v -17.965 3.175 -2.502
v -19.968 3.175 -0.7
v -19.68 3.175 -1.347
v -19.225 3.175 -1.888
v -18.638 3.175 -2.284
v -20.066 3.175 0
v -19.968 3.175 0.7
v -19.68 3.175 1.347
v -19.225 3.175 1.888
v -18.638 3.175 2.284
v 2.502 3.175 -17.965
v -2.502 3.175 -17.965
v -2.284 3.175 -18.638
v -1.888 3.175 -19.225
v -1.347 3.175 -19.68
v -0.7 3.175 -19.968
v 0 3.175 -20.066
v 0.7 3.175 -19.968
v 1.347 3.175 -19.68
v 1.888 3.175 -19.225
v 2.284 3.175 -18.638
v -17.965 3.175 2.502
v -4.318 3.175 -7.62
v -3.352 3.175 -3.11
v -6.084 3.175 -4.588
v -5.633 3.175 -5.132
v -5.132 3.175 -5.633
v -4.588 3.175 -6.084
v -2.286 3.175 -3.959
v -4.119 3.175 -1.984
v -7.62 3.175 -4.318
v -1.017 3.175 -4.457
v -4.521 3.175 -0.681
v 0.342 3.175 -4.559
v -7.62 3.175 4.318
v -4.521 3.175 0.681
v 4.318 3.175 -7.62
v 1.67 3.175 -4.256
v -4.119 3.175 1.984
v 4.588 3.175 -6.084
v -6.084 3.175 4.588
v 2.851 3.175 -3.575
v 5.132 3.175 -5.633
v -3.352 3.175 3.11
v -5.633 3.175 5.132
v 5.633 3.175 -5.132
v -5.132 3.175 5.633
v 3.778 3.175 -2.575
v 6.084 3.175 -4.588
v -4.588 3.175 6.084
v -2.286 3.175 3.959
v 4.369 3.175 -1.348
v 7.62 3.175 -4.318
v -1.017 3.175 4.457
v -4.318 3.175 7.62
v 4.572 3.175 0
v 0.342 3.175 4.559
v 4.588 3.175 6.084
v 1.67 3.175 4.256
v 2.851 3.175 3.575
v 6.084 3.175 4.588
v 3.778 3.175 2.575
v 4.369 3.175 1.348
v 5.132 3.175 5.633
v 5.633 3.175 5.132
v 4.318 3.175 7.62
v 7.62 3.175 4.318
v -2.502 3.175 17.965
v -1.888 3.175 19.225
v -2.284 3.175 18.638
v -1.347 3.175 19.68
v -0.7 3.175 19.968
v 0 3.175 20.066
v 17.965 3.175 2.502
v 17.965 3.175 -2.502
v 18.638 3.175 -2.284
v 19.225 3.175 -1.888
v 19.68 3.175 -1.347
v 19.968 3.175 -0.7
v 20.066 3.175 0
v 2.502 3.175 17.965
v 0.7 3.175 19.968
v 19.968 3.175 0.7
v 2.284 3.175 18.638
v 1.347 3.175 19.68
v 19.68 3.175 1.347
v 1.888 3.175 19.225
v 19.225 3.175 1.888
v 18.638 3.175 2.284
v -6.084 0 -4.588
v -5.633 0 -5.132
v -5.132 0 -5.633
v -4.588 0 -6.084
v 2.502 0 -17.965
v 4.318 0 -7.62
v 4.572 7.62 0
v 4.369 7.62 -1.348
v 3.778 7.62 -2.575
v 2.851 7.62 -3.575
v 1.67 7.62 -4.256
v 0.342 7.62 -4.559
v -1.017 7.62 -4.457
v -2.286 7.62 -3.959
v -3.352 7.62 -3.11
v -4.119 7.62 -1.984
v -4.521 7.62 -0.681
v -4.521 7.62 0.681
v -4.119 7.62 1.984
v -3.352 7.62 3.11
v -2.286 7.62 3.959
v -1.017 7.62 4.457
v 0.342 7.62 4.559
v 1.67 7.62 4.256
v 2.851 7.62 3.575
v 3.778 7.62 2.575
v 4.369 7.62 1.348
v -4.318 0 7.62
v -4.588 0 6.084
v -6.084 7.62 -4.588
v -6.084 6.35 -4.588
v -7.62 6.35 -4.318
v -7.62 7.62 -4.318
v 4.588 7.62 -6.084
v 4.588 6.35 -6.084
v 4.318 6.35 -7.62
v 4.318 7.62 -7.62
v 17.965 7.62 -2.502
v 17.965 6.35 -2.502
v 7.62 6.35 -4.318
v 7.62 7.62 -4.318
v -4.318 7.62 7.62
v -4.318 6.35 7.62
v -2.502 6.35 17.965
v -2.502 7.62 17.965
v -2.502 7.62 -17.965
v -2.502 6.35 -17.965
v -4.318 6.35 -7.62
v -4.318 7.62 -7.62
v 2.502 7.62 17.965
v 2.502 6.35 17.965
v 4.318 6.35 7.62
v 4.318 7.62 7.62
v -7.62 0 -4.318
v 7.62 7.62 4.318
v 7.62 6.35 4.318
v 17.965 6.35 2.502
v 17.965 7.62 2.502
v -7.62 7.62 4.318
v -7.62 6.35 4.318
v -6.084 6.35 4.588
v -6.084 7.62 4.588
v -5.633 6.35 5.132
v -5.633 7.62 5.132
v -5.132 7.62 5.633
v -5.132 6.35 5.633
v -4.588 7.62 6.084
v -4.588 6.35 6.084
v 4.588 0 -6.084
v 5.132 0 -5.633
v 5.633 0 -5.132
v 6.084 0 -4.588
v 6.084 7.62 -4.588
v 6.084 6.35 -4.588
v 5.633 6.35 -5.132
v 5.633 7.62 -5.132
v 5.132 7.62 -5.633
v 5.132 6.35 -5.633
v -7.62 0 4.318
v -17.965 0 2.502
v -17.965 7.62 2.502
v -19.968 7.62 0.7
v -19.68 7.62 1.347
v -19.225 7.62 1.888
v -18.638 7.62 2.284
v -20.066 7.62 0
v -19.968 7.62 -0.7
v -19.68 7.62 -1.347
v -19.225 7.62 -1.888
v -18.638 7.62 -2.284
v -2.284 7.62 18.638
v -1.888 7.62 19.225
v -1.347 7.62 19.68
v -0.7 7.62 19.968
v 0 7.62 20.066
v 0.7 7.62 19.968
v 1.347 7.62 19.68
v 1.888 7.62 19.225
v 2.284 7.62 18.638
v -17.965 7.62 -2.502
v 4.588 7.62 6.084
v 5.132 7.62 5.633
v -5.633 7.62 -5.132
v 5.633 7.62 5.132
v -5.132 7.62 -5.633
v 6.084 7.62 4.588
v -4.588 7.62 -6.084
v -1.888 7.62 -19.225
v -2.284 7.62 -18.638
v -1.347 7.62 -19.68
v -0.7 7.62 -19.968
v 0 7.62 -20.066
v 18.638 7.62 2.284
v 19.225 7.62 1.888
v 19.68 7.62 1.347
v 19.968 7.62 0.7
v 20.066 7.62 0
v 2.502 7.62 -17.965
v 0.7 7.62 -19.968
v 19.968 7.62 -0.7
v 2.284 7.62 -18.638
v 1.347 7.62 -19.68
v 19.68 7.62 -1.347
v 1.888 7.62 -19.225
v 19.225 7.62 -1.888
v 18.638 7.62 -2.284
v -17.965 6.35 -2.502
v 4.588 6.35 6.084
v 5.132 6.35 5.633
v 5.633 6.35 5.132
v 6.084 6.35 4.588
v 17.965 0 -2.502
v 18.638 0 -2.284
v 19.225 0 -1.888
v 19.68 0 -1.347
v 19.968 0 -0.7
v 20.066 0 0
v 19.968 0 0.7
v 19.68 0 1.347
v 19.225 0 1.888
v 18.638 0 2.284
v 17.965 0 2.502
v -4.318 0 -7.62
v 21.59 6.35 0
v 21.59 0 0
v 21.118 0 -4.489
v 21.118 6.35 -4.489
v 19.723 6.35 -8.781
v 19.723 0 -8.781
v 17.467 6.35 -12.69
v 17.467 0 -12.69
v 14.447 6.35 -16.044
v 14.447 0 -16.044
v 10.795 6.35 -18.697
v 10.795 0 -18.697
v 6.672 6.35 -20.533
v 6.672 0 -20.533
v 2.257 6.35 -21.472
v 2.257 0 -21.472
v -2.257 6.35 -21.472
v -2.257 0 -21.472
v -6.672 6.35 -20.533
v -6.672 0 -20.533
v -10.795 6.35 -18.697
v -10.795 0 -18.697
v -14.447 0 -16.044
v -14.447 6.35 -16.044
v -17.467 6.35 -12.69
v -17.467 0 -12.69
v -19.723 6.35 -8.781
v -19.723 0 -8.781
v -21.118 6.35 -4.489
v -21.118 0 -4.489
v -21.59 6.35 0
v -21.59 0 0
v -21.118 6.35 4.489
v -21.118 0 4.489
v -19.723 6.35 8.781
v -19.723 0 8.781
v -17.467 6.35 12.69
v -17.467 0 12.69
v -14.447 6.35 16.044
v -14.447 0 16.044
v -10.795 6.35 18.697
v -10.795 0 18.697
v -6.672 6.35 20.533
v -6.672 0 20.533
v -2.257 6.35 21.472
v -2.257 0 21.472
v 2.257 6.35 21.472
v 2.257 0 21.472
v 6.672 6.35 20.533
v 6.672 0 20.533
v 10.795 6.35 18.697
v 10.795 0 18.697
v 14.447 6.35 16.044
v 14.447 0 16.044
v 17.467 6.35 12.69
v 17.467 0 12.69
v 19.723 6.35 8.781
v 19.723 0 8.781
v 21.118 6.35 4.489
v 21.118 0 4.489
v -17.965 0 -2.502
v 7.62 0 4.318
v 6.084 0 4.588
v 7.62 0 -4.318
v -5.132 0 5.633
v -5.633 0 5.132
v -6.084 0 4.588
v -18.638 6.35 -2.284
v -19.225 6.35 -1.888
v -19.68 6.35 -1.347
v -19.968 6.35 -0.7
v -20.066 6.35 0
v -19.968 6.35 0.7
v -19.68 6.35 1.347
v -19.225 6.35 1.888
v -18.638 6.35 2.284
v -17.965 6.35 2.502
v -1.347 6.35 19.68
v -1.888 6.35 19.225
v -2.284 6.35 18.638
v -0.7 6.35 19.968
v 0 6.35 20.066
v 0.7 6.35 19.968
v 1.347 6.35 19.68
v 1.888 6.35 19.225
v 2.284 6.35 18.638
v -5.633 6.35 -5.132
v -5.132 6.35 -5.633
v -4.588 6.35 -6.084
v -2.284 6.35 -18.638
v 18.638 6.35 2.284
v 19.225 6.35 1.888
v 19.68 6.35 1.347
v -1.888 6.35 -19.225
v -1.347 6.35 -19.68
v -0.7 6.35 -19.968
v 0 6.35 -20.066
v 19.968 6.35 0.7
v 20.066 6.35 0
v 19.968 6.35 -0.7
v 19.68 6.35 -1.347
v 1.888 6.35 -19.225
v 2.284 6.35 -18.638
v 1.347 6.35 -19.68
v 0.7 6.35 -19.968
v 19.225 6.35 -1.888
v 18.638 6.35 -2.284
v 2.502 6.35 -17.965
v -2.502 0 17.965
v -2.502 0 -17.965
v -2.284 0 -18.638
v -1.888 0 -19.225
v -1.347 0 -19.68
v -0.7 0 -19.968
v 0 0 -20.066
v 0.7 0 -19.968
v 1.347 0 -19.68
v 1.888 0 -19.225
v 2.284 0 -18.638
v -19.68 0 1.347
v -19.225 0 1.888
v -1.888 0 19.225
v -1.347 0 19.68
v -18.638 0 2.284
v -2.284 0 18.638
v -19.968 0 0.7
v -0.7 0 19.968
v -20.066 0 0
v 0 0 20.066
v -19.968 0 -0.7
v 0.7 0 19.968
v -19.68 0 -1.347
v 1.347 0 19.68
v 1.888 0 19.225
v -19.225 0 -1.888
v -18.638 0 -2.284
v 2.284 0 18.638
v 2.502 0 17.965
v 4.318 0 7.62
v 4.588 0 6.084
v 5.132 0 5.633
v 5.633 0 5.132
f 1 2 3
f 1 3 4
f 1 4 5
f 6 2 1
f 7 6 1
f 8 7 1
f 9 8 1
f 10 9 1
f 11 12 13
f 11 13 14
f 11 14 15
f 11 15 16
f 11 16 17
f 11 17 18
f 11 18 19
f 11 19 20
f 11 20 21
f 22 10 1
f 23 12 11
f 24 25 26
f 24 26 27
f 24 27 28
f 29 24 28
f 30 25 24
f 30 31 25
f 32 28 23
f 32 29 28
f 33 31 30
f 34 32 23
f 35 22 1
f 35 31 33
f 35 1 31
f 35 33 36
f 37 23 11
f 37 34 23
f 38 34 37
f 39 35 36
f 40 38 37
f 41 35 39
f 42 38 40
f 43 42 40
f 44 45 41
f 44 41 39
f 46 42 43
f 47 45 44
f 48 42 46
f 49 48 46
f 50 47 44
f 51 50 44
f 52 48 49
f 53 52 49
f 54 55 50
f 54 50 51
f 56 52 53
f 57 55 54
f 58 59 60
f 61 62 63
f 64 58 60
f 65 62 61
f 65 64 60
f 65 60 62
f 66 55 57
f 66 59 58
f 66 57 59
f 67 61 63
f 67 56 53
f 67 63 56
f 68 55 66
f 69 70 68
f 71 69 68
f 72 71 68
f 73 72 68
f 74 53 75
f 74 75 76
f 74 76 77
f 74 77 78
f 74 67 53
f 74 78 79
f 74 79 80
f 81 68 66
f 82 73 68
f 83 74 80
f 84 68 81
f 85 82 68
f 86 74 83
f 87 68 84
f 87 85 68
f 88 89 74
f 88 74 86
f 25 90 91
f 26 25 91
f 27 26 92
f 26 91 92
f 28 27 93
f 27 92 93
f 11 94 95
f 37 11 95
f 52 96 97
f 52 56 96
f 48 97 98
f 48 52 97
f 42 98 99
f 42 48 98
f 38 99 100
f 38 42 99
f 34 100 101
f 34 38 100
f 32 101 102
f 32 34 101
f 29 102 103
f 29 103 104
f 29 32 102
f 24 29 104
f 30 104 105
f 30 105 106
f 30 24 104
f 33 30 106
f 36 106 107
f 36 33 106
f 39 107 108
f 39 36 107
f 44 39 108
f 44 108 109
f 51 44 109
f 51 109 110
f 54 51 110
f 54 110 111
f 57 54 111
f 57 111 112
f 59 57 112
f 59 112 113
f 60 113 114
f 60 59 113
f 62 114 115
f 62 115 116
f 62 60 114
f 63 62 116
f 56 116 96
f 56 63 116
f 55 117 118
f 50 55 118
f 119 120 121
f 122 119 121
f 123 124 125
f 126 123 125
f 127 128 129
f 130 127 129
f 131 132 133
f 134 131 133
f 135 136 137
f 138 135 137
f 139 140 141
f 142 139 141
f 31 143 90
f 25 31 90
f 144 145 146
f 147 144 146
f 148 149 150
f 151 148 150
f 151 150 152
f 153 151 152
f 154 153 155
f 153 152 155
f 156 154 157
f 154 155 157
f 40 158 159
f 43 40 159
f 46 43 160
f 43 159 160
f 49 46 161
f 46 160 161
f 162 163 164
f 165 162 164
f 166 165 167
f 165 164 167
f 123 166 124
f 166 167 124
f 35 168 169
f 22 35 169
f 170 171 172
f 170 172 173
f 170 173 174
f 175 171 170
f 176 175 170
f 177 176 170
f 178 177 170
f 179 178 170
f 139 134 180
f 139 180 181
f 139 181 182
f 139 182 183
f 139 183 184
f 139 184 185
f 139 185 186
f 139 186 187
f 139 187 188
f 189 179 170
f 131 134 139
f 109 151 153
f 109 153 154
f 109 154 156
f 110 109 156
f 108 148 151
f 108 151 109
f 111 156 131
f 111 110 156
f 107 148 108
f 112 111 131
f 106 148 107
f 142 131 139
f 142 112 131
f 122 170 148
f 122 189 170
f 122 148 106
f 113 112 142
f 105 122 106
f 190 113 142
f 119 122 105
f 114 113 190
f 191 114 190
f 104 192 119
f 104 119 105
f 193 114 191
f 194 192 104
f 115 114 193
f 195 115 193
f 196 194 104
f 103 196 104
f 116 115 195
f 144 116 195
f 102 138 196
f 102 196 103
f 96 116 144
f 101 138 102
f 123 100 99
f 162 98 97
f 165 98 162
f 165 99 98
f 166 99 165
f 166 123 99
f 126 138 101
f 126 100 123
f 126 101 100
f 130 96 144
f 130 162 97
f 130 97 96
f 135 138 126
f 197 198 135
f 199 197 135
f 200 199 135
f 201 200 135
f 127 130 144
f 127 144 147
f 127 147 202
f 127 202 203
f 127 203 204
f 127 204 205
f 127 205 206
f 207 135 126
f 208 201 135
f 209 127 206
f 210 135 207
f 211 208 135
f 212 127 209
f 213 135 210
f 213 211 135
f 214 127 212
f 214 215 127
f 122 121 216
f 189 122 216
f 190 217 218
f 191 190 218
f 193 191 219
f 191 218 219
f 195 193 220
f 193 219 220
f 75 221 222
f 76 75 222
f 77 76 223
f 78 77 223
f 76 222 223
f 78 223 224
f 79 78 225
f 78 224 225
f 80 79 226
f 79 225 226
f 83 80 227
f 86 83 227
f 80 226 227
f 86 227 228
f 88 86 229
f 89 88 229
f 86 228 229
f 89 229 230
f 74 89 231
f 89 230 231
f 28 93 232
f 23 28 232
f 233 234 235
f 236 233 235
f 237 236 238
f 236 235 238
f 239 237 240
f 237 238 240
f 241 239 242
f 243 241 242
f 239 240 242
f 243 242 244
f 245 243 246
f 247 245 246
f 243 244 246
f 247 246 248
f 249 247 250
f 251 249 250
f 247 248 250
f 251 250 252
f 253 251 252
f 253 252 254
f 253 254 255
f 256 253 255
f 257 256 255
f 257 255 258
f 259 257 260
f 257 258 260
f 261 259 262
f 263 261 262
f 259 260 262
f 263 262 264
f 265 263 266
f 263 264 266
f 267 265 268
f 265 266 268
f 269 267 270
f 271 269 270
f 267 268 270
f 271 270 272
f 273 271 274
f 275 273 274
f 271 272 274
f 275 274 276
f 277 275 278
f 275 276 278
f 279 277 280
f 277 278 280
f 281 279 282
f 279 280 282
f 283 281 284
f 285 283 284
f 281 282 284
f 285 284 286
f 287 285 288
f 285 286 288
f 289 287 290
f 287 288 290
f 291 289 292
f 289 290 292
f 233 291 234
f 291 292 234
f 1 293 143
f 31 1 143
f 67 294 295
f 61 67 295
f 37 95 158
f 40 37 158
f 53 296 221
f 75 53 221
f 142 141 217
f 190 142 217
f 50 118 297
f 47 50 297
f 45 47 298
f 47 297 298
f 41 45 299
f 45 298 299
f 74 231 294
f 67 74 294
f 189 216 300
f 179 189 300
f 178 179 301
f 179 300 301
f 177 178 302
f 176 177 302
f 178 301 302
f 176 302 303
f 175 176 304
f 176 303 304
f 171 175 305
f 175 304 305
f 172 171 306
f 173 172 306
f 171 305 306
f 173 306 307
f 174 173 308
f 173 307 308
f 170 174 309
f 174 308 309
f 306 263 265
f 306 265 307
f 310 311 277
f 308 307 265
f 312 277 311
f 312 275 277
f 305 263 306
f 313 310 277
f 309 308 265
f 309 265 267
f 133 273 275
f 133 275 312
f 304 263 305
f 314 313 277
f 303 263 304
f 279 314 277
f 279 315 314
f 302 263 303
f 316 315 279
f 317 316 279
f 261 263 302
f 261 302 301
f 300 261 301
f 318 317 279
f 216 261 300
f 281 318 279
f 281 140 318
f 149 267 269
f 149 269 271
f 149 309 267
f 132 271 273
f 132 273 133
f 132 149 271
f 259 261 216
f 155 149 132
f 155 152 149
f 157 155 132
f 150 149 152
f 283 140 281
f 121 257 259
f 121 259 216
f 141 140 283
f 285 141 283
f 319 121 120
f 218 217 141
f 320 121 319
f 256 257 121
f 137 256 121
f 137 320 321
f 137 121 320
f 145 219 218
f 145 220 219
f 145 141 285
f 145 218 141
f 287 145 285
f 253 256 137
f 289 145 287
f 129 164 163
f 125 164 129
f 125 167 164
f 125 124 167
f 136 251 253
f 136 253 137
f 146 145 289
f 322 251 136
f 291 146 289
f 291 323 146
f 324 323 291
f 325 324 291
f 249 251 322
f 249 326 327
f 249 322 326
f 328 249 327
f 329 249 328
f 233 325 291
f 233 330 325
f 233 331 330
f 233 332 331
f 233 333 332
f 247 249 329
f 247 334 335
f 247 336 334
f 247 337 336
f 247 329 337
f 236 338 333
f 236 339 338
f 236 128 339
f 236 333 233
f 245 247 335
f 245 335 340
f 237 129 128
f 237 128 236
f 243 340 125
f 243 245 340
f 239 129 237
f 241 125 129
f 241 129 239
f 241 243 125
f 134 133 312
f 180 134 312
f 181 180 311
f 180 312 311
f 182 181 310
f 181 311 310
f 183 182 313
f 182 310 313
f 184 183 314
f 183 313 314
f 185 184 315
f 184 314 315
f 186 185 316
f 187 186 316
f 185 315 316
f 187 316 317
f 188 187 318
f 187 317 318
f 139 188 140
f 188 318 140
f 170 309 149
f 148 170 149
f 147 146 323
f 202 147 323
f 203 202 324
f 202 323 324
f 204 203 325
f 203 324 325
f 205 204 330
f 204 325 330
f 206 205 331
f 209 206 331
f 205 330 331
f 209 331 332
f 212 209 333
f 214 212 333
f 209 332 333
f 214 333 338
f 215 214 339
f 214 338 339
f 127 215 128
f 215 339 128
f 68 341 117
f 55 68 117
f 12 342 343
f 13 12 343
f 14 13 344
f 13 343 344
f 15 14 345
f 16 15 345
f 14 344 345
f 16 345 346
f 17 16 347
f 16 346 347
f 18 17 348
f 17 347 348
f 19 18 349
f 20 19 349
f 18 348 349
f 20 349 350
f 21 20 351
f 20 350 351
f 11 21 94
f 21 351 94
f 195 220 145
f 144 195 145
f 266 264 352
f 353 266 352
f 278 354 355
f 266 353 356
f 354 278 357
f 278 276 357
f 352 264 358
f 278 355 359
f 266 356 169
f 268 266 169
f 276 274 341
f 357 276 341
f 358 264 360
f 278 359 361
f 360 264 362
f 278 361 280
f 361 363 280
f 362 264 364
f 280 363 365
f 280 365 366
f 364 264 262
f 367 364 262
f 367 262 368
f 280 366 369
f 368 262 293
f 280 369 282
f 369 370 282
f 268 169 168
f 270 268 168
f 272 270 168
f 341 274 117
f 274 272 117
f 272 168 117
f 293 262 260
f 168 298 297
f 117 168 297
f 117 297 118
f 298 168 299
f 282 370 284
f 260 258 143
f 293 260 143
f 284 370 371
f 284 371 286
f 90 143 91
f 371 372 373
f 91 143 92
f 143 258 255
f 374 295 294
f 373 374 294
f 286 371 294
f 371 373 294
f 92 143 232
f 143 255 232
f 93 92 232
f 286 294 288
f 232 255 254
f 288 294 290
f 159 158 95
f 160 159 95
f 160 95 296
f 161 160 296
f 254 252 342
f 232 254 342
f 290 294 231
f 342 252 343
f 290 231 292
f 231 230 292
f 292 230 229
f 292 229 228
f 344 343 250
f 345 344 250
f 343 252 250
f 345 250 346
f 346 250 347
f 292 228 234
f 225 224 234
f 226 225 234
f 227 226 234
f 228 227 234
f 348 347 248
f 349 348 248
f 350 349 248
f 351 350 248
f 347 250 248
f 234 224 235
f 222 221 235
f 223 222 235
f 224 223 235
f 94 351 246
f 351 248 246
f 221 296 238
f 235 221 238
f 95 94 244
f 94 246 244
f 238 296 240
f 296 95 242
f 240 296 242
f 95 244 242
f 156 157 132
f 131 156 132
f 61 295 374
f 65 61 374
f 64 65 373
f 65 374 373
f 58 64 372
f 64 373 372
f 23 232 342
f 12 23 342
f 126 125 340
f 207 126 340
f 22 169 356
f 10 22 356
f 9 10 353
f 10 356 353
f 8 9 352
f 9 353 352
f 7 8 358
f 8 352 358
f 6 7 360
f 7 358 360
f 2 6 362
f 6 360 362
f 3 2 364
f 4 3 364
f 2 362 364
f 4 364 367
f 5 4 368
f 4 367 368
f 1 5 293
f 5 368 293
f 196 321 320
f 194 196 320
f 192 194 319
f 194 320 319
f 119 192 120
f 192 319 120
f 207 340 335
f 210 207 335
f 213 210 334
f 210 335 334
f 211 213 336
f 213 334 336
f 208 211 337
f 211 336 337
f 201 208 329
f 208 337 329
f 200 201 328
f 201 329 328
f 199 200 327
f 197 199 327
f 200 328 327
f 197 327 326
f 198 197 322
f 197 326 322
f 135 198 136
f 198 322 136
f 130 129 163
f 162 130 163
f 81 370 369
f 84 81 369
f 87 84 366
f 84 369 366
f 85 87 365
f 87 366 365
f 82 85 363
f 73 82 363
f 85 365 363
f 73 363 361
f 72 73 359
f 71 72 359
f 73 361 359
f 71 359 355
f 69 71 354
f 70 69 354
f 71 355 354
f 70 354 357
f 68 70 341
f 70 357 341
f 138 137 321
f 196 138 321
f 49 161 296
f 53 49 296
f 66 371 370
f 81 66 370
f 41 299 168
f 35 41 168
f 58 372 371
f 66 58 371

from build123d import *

# Parameters (mm, degrees)
SKETCH1_R           = 21.59
BOSS_EXTRUDE1_DEPTH = 6.35
SKETCH2_R           = 4.572
CUT_EXTRUDE1_DEPTH  = 7.35
SKETCH3_R           = 2.54
SKETCH3_R_2         = 7.62
SKETCH3_R_3         = 4.572
CUT_EXTRUDE2_DEPTH  = 3.175
SKETCH4_R           = 2.54
SKETCH4_R_2         = 7.62
SKETCH4_R_3         = 4.572
BOSS_EXTRUDE2_DEPTH = 1.27


with BuildPart() as part:
    # Sketch1 → Boss-Extrude1 (new body)
    with BuildSketch(Plane(origin=(0, 0, 0), x_dir=(1, 0, 0), z_dir=(0, 1, 0))):
        Circle(SKETCH1_R)
    extrude(amount=BOSS_EXTRUDE1_DEPTH)

    # Sketch2 → Cut-Extrude1 (cut, through all)
    with BuildSketch(Plane.XZ):
        Circle(SKETCH2_R)
    extrude(amount=-CUT_EXTRUDE1_DEPTH, mode=Mode.SUBTRACT)

    # Sketch3 → Cut-Extrude2 (cut)
    with BuildSketch(Plane.XZ):
        with BuildLine():
            ThreePointArc((4.587624646, -6.084250168), (0, -7.62), (-4.587624646, -6.084250168))
            Line((-4.587624646, -6.084250168), (-4.318, -7.62))
            Line((-4.318, -7.62), (-2.5017368, -17.965218605))
            ThreePointArc((-2.5017368, -17.965218605), (-0.220441067, -14.995583881), (2.54, -17.526))
            ThreePointArc((2.54, -17.526), (2.530416119, -17.746441067), (2.5017368, -17.965218605))
            Line((2.5017368, -17.965218605), (4.318, -7.62))
            Line((4.318, -7.62), (4.587624646, -6.084250168))
        make_face()
        with Locations((0, -17.526)):
            Circle(SKETCH3_R)
        with BuildLine():
            Line((-17.965218605, -2.5017368), (-7.62, -4.318))
            Line((-7.62, -4.318), (-6.084250168, -4.587624646))
            ThreePointArc((-6.084250168, -4.587624646), (-7.62, 0), (-6.084250168, 4.587624646))
            Line((-6.084250168, 4.587624646), (-7.62, 4.318))
            Line((-7.62, 4.318), (-17.965218605, 2.5017368))
            ThreePointArc((-17.965218605, 2.5017368), (-15.892600976, 1.94514977), (-14.986, 0))
            ThreePointArc((-14.986, 0), (-15.892600976, -1.94514977), (-17.965218605, -2.5017368))
        make_face()
        with Locations((-17.526, 0)):
            Circle(SKETCH3_R)
        Circle(SKETCH3_R_2)
        Circle(SKETCH3_R_3, mode=Mode.SUBTRACT)
        with BuildLine():
            Line((-4.318, 7.62), (-4.587624646, 6.084250168))
            ThreePointArc((-4.587624646, 6.084250168), (0, 7.62), (4.587624646, 6.084250168))
            Line((4.587624646, 6.084250168), (4.318, 7.62))
            Line((4.318, 7.62), (2.5017368, 17.965218605))
            ThreePointArc((2.5017368, 17.965218605), (2.530416119, 17.746441067), (2.54, 17.526))
            ThreePointArc((2.54, 17.526), (-0.220441067, 14.995583881), (-2.5017368, 17.965218605))
            Line((-2.5017368, 17.965218605), (-4.318, 7.62))
        make_face()
        with Locations((0, 17.526)):
            Circle(SKETCH3_R)
        with Locations((17.526, 0)):
            Circle(SKETCH3_R)
        with BuildLine():
            ThreePointArc((7.62, 0), (7.225869715, -2.418926799), (6.084250168, -4.587624646))
            Line((6.084250168, -4.587624646), (7.62, -4.318))
            Line((7.62, -4.318), (17.965218605, -2.5017368))
            ThreePointArc((17.965218605, -2.5017368), (14.986, 0), (17.965218605, 2.5017368))
            Line((17.965218605, 2.5017368), (7.62, 4.318))
            Line((7.62, 4.318), (6.084250168, 4.587624646))
            ThreePointArc((6.084250168, 4.587624646), (7.225869715, 2.418926799), (7.62, 0))
        make_face()
    extrude(amount=-CUT_EXTRUDE2_DEPTH, mode=Mode.SUBTRACT)

    # Sketch4 → Boss-Extrude2 (add)
    with BuildSketch(Plane(origin=(0, 6.35, 0), x_dir=(1, 0, 0), z_dir=(0, 1, 0))):
        with BuildLine():
            Line((4.318, 7.62), (2.5017368, 17.965218605))
            ThreePointArc((2.5017368, 17.965218605), (2.530416119, 17.746441067), (2.54, 17.526))
            ThreePointArc((2.54, 17.526), (-0.220441067, 14.995583881), (-2.5017368, 17.965218605))
            Line((-2.5017368, 17.965218605), (-4.318, 7.62))
            Line((-4.318, 7.62), (-4.587624646, 6.084250168))
            ThreePointArc((-4.587624646, 6.084250168), (0, 7.62), (4.587624646, 6.084250168))
            Line((4.587624646, 6.084250168), (4.318, 7.62))
        make_face()
        with Locations((0, 17.526)):
            Circle(SKETCH4_R)
        with BuildLine():
            Line((-7.62, -4.318), (-6.084250168, -4.587624646))
            ThreePointArc((-6.084250168, -4.587624646), (-7.62, 0), (-6.084250168, 4.587624646))
            Line((-6.084250168, 4.587624646), (-7.62, 4.318))
            Line((-7.62, 4.318), (-17.965218605, 2.5017368))
            ThreePointArc((-17.965218605, 2.5017368), (-15.892600976, 1.94514977), (-14.986, 0))
            ThreePointArc((-14.986, 0), (-15.892600976, -1.94514977), (-17.965218605, -2.5017368))
            Line((-17.965218605, -2.5017368), (-7.62, -4.318))
        make_face()
        with Locations((-17.526, 0)):
            Circle(SKETCH4_R)
        with Locations((0, -17.526)):
            Circle(SKETCH4_R)
        with BuildLine():
            Line((2.5017368, -17.965218605), (4.318, -7.62))
            Line((4.318, -7.62), (4.587624646, -6.084250168))
            ThreePointArc((4.587624646, -6.084250168), (0, -7.62), (-4.587624646, -6.084250168))
            Line((-4.587624646, -6.084250168), (-4.318, -7.62))
            Line((-4.318, -7.62), (-2.5017368, -17.965218605))
            ThreePointArc((-2.5017368, -17.965218605), (-0.220441067, -14.995583881), (2.54, -17.526))
            ThreePointArc((2.54, -17.526), (2.530416119, -17.746441067), (2.5017368, -17.965218605))
        make_face()
        with BuildLine():
            ThreePointArc((7.62, 0), (7.225869715, -2.418926799), (6.084250168, -4.587624646))
            Line((6.084250168, -4.587624646), (7.62, -4.318))
            Line((7.62, -4.318), (17.965218605, -2.5017368))
            ThreePointArc((17.965218605, -2.5017368), (14.986, 0), (17.965218605, 2.5017368))
            Line((17.965218605, 2.5017368), (7.62, 4.318))
            Line((7.62, 4.318), (6.084250168, 4.587624646))
            ThreePointArc((6.084250168, 4.587624646), (7.225869715, 2.418926799), (7.62, 0))
        make_face()
        with Locations((17.526, 0)):
            Circle(SKETCH4_R)
        Circle(SKETCH4_R_2)
        Circle(SKETCH4_R_3, mode=Mode.SUBTRACT)
    extrude(amount=BOSS_EXTRUDE2_DEPTH)


solid = part.part
